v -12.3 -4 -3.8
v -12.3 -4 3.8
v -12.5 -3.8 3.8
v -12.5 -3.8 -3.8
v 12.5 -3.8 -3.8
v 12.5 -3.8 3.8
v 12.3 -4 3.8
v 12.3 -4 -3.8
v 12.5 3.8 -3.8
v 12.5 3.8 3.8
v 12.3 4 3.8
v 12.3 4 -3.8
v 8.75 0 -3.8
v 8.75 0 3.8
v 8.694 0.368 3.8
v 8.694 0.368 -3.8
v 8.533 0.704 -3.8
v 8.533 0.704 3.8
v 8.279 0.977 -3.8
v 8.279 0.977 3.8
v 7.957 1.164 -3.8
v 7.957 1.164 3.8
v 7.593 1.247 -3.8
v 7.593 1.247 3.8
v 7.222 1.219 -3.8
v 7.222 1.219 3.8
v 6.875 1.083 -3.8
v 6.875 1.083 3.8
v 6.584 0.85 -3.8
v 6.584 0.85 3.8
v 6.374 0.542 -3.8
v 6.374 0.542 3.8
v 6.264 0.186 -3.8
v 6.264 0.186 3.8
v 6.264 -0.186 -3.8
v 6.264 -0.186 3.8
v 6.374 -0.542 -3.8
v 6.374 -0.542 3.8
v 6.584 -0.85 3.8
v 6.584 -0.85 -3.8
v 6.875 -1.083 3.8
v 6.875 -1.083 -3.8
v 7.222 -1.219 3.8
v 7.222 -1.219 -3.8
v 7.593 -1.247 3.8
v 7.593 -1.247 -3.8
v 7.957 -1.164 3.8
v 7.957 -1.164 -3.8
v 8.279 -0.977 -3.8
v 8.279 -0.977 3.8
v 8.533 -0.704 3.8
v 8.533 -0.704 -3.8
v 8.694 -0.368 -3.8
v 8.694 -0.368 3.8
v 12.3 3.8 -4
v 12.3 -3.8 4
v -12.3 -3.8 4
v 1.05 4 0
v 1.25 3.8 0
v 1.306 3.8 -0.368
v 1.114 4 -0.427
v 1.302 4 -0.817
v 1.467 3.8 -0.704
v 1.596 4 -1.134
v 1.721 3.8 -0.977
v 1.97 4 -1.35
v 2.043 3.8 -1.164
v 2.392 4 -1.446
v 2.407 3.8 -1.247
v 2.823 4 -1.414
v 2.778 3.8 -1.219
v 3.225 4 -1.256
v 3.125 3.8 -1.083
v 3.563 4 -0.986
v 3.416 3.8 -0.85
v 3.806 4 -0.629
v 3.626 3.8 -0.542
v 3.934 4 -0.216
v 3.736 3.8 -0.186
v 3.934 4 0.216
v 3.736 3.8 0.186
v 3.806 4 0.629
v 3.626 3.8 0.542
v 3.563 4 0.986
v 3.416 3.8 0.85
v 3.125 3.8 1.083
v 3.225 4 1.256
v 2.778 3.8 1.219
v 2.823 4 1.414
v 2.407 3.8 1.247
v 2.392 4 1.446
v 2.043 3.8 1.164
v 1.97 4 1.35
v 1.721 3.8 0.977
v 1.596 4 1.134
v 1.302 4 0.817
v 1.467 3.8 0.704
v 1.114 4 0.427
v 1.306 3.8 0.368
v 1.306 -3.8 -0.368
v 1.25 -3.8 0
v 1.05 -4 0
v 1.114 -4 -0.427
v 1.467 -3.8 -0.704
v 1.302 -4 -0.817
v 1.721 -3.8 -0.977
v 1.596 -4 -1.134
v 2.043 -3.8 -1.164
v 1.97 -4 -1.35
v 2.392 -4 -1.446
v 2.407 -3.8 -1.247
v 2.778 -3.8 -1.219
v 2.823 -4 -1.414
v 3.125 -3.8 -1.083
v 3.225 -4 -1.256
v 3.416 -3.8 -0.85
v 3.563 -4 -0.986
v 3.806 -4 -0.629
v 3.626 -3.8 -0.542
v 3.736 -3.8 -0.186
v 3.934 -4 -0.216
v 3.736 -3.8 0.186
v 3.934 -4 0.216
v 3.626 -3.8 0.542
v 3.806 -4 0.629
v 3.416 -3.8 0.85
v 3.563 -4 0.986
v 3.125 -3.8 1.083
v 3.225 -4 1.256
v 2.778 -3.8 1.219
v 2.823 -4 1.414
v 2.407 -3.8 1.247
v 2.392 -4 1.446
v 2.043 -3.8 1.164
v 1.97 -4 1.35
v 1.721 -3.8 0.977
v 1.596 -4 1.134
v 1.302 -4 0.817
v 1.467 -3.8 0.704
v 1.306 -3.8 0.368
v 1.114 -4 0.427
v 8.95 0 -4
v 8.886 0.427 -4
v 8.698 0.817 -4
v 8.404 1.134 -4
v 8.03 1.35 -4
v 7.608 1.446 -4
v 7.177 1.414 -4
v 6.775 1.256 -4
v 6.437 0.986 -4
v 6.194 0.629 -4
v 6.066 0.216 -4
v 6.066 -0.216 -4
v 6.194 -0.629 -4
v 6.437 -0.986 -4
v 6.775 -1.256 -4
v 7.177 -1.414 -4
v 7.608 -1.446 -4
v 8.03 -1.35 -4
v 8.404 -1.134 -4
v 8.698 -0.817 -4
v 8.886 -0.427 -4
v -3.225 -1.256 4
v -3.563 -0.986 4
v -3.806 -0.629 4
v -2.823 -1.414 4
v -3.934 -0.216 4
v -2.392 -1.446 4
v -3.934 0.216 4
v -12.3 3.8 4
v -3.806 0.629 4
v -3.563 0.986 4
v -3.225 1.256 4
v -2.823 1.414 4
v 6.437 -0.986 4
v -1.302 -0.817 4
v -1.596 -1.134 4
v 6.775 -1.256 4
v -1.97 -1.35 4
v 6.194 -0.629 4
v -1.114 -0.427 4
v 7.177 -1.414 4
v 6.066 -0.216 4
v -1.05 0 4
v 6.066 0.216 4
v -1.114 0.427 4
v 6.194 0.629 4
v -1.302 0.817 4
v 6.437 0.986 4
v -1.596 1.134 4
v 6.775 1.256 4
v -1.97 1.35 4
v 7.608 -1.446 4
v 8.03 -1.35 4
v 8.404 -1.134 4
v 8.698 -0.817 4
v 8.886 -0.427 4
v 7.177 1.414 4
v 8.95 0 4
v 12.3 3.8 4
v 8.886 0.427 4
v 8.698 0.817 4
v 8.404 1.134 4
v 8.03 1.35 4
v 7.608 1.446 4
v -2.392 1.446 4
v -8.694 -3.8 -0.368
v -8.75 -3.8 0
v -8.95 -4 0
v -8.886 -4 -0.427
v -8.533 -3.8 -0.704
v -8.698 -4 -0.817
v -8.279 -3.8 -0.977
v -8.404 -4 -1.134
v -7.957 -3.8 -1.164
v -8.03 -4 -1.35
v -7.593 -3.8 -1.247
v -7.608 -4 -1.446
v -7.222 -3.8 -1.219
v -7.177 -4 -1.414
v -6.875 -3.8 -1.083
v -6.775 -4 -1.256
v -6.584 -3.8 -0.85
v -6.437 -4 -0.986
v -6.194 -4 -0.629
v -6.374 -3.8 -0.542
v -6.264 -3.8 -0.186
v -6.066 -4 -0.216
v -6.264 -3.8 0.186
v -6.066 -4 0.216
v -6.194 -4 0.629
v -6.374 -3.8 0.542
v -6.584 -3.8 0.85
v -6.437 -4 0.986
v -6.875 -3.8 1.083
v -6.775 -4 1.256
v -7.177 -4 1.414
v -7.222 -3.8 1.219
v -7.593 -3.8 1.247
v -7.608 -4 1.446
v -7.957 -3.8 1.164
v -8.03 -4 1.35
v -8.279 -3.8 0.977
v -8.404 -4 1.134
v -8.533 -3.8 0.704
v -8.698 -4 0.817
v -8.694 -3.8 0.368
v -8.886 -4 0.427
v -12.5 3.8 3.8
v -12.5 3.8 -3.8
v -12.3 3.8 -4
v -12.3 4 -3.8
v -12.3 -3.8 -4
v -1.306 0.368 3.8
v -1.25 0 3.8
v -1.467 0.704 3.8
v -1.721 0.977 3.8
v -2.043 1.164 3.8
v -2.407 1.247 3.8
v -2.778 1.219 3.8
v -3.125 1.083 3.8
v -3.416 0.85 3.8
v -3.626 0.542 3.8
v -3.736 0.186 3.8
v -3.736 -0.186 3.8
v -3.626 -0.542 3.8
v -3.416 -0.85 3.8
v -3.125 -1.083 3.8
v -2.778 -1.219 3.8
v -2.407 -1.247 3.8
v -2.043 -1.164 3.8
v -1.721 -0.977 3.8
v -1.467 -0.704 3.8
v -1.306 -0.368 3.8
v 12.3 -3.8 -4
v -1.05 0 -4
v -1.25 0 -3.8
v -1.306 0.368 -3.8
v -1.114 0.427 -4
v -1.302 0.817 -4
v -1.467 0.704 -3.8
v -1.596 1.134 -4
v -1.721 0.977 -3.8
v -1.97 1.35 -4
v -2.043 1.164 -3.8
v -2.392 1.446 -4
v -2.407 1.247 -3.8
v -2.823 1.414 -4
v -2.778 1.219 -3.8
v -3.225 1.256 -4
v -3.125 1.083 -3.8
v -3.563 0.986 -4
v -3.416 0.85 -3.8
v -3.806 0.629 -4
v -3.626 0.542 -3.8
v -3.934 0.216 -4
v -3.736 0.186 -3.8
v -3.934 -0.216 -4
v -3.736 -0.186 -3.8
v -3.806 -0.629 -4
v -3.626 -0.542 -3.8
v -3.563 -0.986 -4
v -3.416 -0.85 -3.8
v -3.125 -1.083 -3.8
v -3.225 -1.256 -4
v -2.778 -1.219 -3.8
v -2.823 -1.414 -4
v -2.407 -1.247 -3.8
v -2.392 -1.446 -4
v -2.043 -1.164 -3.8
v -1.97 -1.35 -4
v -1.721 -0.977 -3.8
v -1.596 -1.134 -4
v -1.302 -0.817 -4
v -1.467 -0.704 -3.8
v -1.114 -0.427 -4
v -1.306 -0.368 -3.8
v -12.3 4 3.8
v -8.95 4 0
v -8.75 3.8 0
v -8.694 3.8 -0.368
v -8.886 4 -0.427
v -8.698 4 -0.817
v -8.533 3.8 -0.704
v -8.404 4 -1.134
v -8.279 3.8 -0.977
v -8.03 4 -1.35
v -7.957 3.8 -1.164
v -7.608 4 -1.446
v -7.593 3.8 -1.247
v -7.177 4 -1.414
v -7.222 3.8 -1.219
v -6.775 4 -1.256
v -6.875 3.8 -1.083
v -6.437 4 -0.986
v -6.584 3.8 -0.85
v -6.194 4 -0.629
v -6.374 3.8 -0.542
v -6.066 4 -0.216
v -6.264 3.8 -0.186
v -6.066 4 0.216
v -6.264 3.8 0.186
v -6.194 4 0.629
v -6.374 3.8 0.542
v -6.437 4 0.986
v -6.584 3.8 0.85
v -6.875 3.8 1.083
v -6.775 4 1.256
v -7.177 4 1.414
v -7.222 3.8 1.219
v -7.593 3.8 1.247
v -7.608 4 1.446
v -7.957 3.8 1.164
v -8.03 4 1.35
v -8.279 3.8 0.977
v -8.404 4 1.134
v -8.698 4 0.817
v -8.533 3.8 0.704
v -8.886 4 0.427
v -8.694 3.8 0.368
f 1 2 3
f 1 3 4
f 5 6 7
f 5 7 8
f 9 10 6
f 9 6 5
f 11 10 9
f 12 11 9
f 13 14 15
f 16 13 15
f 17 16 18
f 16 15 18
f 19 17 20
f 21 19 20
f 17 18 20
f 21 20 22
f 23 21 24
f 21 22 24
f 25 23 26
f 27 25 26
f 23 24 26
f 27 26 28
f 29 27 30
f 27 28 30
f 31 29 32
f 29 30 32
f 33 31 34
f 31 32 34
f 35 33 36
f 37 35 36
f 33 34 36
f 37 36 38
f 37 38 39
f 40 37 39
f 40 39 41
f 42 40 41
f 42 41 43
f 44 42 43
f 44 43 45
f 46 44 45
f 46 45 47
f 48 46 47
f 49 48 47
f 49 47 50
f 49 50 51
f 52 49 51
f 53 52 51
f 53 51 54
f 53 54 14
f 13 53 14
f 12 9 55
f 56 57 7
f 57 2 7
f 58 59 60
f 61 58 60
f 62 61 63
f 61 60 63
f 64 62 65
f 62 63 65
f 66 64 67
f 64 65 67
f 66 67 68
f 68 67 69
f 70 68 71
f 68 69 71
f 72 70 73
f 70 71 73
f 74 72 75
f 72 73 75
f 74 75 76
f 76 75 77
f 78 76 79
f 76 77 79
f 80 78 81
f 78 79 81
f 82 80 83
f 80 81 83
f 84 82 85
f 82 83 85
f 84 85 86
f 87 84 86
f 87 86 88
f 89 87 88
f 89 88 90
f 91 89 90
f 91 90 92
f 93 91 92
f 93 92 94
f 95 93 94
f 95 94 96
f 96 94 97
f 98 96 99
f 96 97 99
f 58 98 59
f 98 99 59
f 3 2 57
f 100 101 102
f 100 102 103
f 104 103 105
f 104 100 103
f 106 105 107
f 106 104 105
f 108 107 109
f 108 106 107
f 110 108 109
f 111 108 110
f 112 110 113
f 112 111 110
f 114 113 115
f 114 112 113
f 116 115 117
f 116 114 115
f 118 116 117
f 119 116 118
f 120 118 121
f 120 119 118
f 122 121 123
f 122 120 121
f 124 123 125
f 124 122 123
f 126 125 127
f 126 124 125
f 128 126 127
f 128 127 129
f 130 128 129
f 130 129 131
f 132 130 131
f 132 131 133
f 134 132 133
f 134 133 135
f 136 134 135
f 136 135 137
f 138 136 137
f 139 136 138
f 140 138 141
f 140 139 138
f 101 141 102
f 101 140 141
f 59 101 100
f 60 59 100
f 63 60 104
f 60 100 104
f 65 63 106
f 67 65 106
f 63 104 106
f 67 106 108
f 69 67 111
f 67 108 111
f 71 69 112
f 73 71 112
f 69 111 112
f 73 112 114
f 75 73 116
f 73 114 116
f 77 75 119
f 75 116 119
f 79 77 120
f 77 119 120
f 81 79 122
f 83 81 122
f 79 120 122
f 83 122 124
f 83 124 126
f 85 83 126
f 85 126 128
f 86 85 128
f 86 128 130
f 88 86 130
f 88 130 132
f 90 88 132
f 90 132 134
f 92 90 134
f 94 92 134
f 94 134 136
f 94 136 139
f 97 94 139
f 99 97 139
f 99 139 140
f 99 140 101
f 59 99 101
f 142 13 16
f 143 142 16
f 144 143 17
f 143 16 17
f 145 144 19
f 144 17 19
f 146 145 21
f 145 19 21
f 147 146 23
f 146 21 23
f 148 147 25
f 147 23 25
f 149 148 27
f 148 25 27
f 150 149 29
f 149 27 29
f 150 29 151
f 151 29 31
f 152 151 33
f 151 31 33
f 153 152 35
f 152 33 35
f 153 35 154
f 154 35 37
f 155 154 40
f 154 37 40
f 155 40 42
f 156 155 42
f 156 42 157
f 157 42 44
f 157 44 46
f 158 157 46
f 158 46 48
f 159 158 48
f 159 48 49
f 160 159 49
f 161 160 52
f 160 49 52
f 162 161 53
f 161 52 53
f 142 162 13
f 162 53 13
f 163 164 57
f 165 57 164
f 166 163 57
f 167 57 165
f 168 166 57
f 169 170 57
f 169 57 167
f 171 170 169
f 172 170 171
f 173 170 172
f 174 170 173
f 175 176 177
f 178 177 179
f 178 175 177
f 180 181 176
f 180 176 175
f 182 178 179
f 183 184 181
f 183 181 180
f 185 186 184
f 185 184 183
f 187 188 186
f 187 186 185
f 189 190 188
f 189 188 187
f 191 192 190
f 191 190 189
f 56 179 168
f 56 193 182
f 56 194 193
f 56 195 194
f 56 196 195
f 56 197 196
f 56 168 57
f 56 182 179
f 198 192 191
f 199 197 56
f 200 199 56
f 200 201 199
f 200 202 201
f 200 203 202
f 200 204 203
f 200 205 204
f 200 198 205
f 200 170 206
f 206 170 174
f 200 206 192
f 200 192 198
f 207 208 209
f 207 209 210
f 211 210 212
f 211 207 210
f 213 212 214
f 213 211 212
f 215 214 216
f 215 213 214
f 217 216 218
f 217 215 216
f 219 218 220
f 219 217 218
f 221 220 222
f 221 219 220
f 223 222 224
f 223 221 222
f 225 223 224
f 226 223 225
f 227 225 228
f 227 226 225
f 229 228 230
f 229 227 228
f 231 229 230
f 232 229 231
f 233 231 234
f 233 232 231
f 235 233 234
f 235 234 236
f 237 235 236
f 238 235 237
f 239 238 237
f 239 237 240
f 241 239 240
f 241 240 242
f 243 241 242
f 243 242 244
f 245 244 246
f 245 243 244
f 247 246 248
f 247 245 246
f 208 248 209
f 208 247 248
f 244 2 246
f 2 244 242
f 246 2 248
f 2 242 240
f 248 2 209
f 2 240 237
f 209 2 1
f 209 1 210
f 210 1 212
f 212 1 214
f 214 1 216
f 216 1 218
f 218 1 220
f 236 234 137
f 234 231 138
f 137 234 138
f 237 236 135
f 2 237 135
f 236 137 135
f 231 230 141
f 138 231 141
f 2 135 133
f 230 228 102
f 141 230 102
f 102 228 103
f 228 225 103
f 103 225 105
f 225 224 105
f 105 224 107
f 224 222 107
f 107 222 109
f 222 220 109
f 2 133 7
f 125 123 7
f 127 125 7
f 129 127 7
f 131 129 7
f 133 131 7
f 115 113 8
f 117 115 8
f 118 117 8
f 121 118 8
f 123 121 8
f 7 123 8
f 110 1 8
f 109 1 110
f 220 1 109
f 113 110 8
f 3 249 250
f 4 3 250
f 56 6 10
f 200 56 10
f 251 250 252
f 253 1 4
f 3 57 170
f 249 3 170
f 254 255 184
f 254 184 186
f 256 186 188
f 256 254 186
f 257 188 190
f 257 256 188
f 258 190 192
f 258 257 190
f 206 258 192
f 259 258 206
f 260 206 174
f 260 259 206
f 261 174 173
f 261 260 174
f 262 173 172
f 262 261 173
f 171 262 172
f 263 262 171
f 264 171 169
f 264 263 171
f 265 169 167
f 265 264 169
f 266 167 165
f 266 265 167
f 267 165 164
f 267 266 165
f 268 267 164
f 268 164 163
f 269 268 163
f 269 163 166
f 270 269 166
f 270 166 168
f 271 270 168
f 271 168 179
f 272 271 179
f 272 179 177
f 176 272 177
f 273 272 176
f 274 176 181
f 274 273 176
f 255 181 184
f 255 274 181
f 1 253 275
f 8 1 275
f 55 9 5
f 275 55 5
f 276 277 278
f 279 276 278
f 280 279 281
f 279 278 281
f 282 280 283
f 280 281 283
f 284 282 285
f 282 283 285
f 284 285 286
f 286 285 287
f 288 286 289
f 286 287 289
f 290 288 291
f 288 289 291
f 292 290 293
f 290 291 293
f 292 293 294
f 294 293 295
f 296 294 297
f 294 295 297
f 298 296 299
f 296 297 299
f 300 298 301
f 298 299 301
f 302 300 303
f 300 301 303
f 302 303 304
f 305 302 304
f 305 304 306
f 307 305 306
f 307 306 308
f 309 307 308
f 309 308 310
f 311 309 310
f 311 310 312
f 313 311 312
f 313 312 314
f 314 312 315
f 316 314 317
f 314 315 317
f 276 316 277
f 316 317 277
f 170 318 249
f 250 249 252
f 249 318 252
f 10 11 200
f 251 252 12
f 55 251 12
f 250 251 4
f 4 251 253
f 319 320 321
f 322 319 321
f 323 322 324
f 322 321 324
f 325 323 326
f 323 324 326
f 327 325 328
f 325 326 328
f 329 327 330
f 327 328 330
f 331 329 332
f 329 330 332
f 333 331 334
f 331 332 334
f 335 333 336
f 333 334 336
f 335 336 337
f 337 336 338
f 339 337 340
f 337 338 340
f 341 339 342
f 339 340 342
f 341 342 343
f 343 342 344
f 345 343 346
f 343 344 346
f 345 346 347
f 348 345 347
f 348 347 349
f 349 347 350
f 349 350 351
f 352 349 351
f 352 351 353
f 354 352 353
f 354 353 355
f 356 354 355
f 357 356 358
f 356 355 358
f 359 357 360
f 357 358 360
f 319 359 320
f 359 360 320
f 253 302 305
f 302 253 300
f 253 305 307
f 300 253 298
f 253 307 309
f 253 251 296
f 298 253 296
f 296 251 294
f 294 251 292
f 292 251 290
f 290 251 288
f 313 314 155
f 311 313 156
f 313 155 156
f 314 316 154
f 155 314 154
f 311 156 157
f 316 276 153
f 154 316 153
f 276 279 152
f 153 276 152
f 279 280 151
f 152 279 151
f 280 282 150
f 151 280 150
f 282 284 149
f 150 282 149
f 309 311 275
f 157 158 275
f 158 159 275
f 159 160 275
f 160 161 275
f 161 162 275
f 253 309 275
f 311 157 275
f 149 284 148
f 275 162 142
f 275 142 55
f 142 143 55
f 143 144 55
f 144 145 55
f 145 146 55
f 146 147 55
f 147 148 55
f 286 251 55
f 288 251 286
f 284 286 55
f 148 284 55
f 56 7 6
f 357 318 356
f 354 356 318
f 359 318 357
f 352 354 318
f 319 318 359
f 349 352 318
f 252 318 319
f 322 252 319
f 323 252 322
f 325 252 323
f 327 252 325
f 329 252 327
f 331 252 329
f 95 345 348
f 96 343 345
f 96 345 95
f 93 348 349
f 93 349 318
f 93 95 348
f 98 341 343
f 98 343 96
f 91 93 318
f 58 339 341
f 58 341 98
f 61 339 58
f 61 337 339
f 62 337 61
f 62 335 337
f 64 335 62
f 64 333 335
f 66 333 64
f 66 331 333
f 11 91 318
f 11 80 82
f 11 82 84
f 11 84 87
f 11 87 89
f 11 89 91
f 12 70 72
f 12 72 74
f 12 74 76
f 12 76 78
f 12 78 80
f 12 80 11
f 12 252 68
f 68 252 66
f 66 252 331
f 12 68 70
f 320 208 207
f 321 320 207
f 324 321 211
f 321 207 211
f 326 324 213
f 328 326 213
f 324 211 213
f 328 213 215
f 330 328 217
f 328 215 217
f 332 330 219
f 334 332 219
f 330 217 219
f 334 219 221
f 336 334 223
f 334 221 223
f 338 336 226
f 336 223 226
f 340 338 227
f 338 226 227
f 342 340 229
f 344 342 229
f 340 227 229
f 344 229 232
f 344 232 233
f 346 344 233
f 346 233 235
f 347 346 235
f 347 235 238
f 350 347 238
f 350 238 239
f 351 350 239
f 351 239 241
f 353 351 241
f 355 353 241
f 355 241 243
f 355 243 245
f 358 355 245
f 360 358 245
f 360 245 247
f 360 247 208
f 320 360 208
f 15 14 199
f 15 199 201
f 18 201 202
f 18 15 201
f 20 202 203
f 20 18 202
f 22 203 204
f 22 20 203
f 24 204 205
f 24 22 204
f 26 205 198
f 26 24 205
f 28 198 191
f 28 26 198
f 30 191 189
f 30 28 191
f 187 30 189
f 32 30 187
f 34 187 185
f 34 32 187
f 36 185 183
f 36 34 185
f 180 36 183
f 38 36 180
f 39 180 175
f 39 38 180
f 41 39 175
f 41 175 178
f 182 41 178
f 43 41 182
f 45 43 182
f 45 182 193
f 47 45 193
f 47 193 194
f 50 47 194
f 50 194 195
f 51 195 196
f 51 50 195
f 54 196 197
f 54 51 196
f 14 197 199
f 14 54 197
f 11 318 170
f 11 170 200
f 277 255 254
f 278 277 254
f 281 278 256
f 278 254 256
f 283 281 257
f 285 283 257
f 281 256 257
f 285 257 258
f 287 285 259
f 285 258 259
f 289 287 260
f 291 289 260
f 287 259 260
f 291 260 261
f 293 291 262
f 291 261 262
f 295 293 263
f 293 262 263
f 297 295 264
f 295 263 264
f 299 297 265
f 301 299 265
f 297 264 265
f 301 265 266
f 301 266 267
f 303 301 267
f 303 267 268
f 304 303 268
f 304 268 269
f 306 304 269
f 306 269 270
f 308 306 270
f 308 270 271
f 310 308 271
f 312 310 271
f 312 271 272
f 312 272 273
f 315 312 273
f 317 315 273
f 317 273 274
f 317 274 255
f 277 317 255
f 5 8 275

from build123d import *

# Parameters (mm, degrees)
SKETCH_1_W         = 25
SKETCH_1_H         = 8
EXTRUDE_1_DEPTH    = 4
HOLE_WIZARD_M3_1_D = 2.5
HOLE_WIZARD_M3_2_D = 2.5
CHAMFER_1_SIZE     = 0.2


with BuildPart() as part:
    # 草图1 → 凸台-拉伸1 (new, symmetric)
    with BuildSketch(Plane(origin=(0, 0, 0), x_dir=(1, 0, 0), z_dir=(0, 1, 0))):
        Rectangle(SKETCH_1_W, SKETCH_1_H)
    extrude(amount=EXTRUDE_1_DEPTH, both=True)

    # M3 螺纹孔1 (through all)
    with Locations(Plane(origin=(0, 4, 0), x_dir=(1, 0, 0), z_dir=(0, 1, 0))):
        with Locations((-7.5, 0), (2.5, 0)):
            Hole(HOLE_WIZARD_M3_1_D / 2)

    # M3 螺纹孔2 (through all)
    with Locations(Plane(origin=(0, 0, -4), x_dir=(-1, 0, 0), z_dir=(0, 0, -1))):
        with Locations((-7.5, 0), (2.5, 0)):
            Hole(HOLE_WIZARD_M3_2_D / 2)

    # 倒角1
    chamfer_1_edges = [part.edges().sort_by_distance(p)[0] for p in [
        (-12.5, 4, 0),
        (3.75, 4, 0),
        (3.75, -4, 0),
        (0, 4, 4),
        (-6.25, 4, 0),
        (-6.25, -4, 0),
        (-3.75, 0, -4),
        (-3.75, 0, 4),
        (6.25, 0, -4),
        (6.25, 0, 4),
        (12.5, 4, 0),
        (0, -4, 4),
        (-12.5, -4, 0),
        (0, -4, -4),
        (12.5, -4, 0),
        (12.5, 0, 4),
        (-12.5, 0, 4),
        (-12.5, 0, -4),
        (12.5, 0, -4),
        (0, 4, -4),
    ]]
    chamfer(chamfer_1_edges, length=CHAMFER_1_SIZE)


solid = part.part
